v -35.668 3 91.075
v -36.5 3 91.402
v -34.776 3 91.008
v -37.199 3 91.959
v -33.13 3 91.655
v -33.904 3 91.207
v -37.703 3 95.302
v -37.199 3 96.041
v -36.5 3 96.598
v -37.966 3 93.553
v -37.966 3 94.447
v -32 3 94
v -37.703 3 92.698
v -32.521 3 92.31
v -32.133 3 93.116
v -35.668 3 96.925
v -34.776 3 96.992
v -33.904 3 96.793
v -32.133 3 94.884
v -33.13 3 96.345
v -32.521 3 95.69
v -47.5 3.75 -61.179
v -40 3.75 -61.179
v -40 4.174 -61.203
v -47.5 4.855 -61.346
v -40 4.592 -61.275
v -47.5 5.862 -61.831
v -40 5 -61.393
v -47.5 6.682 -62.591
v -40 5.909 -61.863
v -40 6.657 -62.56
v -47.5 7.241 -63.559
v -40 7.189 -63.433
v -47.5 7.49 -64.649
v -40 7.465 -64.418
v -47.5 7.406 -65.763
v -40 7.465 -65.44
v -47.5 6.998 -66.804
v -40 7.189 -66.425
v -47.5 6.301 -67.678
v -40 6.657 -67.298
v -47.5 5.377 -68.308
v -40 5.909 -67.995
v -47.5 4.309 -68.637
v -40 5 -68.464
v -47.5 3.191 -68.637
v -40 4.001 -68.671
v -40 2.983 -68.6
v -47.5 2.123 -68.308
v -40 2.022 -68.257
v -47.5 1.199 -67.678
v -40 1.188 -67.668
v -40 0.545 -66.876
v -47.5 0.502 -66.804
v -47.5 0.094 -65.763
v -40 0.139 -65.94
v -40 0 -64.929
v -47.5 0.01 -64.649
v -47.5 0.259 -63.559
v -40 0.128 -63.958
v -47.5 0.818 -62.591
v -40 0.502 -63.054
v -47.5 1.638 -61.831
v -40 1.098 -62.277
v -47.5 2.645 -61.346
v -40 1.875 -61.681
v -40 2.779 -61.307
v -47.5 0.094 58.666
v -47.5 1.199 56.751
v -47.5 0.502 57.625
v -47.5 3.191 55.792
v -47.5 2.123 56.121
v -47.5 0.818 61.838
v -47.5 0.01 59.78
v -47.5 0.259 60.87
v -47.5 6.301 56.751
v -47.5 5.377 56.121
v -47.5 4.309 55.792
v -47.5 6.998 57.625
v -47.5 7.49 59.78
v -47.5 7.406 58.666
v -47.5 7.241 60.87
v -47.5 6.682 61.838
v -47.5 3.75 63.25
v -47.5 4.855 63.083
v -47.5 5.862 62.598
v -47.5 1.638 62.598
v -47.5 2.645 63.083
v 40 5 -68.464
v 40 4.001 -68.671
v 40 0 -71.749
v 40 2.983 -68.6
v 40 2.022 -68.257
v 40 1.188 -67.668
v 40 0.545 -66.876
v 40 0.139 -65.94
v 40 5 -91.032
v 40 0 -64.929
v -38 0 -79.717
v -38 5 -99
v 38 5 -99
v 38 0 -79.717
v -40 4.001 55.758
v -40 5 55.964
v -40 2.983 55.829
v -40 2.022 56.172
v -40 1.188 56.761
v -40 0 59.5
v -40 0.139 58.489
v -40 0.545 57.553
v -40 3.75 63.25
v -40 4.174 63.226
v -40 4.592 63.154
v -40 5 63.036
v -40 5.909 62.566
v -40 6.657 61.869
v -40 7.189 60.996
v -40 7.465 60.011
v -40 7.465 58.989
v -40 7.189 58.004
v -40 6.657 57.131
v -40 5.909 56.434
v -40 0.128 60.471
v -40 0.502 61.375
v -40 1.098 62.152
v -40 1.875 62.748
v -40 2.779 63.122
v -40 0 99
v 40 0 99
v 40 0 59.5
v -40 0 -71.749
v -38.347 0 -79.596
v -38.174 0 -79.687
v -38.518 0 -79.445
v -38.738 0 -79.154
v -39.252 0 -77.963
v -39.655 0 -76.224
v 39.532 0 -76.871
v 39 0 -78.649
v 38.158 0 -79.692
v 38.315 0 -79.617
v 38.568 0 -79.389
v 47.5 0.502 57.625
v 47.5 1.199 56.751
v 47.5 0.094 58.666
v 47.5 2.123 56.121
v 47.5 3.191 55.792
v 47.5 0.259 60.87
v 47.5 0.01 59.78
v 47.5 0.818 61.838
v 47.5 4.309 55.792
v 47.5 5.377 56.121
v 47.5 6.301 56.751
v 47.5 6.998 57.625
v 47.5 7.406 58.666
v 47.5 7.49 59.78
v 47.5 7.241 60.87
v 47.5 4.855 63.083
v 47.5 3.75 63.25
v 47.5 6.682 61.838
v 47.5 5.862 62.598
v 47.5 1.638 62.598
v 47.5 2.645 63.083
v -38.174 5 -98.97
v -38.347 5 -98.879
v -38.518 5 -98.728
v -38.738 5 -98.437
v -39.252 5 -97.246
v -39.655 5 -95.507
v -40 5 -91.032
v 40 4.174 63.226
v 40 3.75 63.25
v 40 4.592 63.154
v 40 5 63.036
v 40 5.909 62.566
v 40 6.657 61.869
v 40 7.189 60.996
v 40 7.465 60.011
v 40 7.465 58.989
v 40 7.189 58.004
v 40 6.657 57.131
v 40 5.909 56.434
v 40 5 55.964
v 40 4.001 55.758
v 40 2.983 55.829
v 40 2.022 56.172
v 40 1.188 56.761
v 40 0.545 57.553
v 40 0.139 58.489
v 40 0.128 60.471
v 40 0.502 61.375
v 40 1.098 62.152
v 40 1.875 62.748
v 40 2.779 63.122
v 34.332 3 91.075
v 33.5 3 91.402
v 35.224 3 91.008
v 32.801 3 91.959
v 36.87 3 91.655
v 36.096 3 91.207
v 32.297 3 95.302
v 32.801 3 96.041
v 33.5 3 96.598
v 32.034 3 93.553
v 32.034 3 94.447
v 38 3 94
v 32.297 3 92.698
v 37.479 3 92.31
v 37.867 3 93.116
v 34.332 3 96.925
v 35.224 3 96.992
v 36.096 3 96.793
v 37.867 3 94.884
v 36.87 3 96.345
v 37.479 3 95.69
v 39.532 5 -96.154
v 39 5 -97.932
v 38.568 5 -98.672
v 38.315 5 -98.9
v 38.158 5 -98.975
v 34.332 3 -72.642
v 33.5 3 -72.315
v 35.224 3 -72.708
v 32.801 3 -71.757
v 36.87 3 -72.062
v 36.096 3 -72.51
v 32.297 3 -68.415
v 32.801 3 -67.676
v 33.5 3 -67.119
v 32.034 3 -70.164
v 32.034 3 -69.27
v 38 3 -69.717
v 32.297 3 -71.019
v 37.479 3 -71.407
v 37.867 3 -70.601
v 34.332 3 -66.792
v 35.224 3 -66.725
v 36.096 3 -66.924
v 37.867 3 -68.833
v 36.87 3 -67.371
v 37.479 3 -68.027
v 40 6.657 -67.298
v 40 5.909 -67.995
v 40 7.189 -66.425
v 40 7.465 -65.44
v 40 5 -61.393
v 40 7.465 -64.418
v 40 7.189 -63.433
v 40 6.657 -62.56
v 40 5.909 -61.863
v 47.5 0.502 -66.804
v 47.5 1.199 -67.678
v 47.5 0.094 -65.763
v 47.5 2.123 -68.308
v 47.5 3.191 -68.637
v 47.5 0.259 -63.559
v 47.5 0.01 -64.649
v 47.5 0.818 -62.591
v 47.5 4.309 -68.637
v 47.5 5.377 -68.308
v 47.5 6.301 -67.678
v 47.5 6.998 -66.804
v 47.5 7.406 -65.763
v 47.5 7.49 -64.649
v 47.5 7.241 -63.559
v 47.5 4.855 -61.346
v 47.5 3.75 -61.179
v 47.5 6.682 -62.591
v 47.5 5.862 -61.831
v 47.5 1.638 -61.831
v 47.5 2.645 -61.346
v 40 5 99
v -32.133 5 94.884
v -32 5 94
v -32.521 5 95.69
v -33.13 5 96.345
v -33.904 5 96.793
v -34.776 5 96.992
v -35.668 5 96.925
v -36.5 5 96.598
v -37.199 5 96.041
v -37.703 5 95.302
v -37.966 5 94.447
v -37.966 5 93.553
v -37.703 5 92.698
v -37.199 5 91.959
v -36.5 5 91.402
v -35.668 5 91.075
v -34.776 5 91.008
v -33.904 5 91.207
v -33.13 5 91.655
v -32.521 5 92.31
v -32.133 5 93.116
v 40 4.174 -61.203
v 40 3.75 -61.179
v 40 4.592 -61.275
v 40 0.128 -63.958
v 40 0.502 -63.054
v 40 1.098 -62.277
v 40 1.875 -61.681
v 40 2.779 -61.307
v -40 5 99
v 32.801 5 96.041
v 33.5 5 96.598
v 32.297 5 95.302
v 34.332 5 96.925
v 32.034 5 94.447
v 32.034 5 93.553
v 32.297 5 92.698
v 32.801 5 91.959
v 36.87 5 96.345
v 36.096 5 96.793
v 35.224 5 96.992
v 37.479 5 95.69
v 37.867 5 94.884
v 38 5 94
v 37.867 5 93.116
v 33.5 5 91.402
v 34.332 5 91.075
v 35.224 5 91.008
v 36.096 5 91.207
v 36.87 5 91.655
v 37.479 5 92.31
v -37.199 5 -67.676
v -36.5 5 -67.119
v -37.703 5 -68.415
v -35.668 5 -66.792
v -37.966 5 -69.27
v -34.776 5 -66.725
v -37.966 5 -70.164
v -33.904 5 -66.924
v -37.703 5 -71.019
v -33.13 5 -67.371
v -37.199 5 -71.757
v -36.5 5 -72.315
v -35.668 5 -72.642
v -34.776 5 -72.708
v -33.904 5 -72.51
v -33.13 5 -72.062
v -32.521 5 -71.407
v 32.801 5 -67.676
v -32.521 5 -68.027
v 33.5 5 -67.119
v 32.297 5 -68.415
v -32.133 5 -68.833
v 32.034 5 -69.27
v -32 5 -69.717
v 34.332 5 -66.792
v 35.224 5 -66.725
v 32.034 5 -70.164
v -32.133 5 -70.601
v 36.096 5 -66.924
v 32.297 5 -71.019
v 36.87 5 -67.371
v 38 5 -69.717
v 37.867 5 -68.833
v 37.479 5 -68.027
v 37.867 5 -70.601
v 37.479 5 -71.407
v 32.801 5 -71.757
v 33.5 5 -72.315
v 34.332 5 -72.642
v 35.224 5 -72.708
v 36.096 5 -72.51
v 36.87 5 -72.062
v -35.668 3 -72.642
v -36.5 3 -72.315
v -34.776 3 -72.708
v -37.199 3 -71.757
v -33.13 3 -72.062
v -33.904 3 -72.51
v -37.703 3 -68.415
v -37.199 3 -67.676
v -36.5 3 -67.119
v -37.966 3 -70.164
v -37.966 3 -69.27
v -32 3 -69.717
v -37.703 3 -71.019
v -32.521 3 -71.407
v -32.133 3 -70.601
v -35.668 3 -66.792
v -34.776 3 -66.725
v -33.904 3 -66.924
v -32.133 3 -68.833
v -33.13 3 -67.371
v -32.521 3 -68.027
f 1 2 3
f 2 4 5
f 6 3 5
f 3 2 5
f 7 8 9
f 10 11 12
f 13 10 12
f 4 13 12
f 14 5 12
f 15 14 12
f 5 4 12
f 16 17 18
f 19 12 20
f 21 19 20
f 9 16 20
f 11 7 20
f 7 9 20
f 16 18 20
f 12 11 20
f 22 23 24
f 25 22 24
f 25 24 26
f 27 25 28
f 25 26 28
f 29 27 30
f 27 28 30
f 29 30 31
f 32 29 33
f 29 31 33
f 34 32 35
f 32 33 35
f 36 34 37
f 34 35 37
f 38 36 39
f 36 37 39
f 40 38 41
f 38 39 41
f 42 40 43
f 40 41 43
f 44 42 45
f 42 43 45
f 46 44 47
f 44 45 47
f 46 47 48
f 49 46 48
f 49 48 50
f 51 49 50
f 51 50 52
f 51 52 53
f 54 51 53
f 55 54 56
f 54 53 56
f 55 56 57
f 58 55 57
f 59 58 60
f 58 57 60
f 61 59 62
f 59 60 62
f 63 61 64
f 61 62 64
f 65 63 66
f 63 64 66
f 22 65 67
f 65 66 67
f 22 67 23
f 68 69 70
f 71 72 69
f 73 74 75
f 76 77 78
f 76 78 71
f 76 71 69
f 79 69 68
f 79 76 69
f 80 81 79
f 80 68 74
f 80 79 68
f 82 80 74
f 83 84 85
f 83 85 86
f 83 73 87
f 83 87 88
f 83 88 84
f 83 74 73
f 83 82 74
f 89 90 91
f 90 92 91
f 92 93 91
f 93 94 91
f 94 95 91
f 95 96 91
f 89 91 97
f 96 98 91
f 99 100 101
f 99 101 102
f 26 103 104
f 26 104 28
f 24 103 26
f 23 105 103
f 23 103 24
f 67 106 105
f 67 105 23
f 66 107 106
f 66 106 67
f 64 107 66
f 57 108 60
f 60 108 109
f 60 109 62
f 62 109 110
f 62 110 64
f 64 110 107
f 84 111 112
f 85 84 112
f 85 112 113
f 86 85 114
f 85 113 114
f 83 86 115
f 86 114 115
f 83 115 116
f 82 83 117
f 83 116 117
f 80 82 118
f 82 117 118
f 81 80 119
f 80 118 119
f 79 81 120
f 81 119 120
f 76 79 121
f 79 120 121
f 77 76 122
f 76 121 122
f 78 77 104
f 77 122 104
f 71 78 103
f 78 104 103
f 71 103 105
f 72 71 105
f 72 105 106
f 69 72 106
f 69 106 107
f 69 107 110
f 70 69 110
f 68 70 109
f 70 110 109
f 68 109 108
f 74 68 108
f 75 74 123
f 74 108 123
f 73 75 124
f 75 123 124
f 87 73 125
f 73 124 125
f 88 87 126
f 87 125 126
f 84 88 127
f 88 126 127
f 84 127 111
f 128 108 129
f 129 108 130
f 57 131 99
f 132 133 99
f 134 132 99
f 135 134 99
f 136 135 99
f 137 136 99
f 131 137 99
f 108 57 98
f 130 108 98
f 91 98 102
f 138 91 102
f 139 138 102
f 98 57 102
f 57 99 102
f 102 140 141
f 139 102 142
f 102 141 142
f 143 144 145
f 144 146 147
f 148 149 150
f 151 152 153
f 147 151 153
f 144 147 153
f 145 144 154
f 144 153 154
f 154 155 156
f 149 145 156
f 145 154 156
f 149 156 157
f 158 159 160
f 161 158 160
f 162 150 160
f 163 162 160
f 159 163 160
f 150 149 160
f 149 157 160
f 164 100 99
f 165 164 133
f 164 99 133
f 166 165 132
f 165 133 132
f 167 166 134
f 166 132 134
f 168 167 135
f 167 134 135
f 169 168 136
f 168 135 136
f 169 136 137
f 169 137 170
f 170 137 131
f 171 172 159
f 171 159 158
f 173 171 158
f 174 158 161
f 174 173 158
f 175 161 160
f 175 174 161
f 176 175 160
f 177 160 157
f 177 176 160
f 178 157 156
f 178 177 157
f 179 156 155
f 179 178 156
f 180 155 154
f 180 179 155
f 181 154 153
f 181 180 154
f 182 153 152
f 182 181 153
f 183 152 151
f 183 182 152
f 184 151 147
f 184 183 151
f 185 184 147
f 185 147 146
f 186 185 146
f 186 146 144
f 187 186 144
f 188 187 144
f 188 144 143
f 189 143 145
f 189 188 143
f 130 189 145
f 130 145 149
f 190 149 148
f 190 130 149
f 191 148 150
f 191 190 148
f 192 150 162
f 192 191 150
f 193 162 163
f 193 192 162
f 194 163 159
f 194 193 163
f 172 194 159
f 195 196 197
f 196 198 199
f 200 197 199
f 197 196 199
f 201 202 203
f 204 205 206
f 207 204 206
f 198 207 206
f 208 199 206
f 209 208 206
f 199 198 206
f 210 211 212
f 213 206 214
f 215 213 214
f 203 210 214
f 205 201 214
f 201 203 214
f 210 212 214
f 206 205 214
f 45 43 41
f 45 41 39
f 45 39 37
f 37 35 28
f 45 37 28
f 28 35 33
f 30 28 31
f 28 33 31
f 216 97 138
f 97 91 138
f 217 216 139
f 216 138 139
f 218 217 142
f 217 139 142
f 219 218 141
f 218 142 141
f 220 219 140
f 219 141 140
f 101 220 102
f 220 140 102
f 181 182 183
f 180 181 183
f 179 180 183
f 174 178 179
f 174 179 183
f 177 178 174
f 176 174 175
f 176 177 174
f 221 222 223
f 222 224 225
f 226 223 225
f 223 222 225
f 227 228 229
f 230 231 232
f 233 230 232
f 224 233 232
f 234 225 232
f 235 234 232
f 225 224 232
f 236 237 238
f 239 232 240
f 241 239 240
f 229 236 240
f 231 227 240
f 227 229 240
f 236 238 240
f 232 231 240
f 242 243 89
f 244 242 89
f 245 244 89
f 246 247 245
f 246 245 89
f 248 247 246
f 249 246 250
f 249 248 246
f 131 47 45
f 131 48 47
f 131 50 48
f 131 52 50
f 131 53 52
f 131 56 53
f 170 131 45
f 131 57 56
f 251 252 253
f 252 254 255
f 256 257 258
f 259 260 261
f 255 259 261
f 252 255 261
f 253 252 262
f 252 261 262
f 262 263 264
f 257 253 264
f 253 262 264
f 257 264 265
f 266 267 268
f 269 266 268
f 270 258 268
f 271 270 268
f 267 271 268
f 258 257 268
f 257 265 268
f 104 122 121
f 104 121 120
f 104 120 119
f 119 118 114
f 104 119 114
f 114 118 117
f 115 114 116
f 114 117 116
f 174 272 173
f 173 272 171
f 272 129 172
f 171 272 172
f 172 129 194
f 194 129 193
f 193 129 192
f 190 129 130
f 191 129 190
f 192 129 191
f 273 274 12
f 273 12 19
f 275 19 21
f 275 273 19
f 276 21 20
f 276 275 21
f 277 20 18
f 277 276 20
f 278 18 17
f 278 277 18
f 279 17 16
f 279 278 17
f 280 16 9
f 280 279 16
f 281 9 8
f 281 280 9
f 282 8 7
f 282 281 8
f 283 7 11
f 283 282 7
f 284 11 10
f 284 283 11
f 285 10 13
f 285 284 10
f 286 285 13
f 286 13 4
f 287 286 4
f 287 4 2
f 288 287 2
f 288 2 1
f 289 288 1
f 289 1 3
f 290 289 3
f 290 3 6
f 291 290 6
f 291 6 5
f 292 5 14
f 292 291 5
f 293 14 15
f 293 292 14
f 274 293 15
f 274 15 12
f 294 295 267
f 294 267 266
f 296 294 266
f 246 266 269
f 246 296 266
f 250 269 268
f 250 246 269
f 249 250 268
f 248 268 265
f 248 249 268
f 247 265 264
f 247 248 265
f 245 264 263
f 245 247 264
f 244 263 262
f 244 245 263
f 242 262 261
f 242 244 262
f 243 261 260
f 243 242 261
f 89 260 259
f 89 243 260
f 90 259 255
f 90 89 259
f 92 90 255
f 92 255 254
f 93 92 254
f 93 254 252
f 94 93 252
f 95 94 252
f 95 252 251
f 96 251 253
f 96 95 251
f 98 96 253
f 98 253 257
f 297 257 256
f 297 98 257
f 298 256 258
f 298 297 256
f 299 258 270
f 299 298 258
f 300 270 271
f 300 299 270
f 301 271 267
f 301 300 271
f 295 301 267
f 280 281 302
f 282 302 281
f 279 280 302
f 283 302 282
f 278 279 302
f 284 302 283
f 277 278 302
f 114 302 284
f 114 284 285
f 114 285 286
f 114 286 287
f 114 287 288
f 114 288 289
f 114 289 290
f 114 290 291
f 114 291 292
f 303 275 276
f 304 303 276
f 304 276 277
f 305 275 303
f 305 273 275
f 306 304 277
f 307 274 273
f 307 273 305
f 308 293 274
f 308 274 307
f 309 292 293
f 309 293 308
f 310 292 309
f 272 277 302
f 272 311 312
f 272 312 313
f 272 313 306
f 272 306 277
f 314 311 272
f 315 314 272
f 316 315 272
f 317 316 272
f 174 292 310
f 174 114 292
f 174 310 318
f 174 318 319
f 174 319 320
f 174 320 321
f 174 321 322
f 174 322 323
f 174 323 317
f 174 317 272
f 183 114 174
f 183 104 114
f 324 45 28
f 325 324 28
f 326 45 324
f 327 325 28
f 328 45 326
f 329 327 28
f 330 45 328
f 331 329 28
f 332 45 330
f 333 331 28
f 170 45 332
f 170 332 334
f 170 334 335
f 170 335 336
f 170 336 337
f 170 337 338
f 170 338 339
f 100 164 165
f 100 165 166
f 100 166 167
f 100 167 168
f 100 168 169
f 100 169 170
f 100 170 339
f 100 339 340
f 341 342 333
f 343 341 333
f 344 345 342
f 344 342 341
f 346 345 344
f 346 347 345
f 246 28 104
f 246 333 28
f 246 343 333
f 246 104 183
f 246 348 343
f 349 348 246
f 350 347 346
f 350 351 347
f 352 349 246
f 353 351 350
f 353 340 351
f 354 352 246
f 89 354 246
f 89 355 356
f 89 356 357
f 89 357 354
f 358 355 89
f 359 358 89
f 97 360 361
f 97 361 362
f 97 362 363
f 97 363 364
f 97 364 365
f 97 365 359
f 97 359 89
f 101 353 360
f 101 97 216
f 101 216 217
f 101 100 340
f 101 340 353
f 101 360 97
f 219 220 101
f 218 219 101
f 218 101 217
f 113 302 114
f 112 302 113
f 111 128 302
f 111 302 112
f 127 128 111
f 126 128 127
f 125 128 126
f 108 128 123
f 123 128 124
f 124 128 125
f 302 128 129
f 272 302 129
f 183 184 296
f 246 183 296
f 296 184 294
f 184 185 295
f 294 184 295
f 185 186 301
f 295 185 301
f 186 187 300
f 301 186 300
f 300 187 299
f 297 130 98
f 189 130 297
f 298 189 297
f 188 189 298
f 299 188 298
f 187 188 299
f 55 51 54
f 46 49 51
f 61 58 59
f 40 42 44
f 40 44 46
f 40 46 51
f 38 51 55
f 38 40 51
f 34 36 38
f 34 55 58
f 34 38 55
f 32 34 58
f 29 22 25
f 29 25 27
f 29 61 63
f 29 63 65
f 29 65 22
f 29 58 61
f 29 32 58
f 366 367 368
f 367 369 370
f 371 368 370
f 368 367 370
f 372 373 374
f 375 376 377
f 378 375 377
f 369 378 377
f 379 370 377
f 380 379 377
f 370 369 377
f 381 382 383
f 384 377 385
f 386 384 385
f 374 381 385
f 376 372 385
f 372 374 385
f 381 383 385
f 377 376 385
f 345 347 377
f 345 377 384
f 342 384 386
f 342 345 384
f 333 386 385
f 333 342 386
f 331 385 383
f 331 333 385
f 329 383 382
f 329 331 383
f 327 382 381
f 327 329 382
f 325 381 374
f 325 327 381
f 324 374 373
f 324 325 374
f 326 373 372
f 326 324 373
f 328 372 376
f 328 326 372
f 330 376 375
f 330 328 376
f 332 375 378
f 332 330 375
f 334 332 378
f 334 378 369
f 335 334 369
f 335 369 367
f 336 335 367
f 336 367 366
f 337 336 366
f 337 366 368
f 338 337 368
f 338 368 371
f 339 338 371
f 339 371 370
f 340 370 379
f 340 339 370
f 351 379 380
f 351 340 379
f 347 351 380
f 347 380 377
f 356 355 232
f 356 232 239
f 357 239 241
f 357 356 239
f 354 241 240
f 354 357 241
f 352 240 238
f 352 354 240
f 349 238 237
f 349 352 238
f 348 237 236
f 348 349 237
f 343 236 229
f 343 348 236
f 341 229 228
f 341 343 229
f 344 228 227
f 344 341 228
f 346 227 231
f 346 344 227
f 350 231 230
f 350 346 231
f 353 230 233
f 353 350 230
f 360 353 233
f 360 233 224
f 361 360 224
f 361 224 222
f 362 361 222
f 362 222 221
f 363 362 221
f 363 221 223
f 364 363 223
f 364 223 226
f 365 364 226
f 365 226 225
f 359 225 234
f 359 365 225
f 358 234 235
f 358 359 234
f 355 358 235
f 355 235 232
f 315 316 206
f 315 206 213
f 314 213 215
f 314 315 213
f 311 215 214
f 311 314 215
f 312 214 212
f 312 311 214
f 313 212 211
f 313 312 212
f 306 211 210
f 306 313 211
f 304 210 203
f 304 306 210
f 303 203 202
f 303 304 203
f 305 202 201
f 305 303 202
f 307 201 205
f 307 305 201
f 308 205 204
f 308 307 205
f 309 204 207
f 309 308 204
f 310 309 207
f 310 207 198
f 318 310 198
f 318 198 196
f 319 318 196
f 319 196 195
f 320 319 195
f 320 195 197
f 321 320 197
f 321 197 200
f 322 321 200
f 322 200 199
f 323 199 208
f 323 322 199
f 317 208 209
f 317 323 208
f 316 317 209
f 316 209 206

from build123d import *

# Parameters (mm, degrees)
SKETCH1_W           = 80
SKETCH1_H           = 198
BOSS_EXTRUDE1_DEPTH = 5
SKETCH2_R           = 3.75
BOSS_EXTRUDE2_DEPTH = 7.5
CUT_EXTRUDE1_DEPTH  = 88.5
FILLET2_R           = 2
CUT_EXTRUDE2_START  = -5
SKETCH4_R           = 3
CUT_EXTRUDE2_DEPTH  = 2


with BuildPart() as part:
    # Sketch1 → Boss-Extrude1 (new body)
    with BuildSketch(Plane(origin=(0, 0, 0), x_dir=(1, 0, 0), z_dir=(0, 1, 0))):
        Rectangle(SKETCH1_W, SKETCH1_H)
    extrude(amount=BOSS_EXTRUDE1_DEPTH)

    # Sketch2 → Boss-Extrude2 (add)
    with BuildSketch(Plane.ZY.offset(40)):
        with Locations((-64.928905814, 3.75)):
            Circle(SKETCH2_R)
        with Locations((59.5, 3.75)):
            Circle(SKETCH2_R)
    boss_extrude2 = extrude(amount=BOSS_EXTRUDE2_DEPTH)

    # Mirror1: Boss-Extrude2 across plane
    add(boss_extrude2.mirror(Plane(origin=(0, 0, 0), x_dir=(0, 0, 1), z_dir=(1, 0, 0))))

    # Sketch3 → Cut-Extrude1 (cut, through all)
    with BuildSketch(Plane.ZY.offset(40)):
        Polygon((-99, 5), (-72.932513489, -1.759148434), (-103.799311702, -1.759148434), align=None)
    extrude(amount=-CUT_EXTRUDE1_DEPTH, mode=Mode.SUBTRACT)

    # Fillet2
    fillet2_edges = [part.edges().sort_by_distance(p)[0] for p in [
        (40, 2.5, -89.358442796),
        (-40, 2.5, -89.358442796),
    ]]
    fillet(fillet2_edges, radius=FILLET2_R)

    # Sketch4 → Cut-Extrude2 (cut)
    with BuildSketch(Plane.XZ.offset(CUT_EXTRUDE2_START)):
        with Locations((-35, -69.716885591)):
            Circle(SKETCH4_R)
        with Locations((35, -69.716885591)):
            Circle(SKETCH4_R)
        with Locations((-35, 94)):
            Circle(SKETCH4_R)
        with Locations((35, 94)):
            Circle(SKETCH4_R)
    extrude(amount=CUT_EXTRUDE2_DEPTH, mode=Mode.SUBTRACT)


solid = part.part
